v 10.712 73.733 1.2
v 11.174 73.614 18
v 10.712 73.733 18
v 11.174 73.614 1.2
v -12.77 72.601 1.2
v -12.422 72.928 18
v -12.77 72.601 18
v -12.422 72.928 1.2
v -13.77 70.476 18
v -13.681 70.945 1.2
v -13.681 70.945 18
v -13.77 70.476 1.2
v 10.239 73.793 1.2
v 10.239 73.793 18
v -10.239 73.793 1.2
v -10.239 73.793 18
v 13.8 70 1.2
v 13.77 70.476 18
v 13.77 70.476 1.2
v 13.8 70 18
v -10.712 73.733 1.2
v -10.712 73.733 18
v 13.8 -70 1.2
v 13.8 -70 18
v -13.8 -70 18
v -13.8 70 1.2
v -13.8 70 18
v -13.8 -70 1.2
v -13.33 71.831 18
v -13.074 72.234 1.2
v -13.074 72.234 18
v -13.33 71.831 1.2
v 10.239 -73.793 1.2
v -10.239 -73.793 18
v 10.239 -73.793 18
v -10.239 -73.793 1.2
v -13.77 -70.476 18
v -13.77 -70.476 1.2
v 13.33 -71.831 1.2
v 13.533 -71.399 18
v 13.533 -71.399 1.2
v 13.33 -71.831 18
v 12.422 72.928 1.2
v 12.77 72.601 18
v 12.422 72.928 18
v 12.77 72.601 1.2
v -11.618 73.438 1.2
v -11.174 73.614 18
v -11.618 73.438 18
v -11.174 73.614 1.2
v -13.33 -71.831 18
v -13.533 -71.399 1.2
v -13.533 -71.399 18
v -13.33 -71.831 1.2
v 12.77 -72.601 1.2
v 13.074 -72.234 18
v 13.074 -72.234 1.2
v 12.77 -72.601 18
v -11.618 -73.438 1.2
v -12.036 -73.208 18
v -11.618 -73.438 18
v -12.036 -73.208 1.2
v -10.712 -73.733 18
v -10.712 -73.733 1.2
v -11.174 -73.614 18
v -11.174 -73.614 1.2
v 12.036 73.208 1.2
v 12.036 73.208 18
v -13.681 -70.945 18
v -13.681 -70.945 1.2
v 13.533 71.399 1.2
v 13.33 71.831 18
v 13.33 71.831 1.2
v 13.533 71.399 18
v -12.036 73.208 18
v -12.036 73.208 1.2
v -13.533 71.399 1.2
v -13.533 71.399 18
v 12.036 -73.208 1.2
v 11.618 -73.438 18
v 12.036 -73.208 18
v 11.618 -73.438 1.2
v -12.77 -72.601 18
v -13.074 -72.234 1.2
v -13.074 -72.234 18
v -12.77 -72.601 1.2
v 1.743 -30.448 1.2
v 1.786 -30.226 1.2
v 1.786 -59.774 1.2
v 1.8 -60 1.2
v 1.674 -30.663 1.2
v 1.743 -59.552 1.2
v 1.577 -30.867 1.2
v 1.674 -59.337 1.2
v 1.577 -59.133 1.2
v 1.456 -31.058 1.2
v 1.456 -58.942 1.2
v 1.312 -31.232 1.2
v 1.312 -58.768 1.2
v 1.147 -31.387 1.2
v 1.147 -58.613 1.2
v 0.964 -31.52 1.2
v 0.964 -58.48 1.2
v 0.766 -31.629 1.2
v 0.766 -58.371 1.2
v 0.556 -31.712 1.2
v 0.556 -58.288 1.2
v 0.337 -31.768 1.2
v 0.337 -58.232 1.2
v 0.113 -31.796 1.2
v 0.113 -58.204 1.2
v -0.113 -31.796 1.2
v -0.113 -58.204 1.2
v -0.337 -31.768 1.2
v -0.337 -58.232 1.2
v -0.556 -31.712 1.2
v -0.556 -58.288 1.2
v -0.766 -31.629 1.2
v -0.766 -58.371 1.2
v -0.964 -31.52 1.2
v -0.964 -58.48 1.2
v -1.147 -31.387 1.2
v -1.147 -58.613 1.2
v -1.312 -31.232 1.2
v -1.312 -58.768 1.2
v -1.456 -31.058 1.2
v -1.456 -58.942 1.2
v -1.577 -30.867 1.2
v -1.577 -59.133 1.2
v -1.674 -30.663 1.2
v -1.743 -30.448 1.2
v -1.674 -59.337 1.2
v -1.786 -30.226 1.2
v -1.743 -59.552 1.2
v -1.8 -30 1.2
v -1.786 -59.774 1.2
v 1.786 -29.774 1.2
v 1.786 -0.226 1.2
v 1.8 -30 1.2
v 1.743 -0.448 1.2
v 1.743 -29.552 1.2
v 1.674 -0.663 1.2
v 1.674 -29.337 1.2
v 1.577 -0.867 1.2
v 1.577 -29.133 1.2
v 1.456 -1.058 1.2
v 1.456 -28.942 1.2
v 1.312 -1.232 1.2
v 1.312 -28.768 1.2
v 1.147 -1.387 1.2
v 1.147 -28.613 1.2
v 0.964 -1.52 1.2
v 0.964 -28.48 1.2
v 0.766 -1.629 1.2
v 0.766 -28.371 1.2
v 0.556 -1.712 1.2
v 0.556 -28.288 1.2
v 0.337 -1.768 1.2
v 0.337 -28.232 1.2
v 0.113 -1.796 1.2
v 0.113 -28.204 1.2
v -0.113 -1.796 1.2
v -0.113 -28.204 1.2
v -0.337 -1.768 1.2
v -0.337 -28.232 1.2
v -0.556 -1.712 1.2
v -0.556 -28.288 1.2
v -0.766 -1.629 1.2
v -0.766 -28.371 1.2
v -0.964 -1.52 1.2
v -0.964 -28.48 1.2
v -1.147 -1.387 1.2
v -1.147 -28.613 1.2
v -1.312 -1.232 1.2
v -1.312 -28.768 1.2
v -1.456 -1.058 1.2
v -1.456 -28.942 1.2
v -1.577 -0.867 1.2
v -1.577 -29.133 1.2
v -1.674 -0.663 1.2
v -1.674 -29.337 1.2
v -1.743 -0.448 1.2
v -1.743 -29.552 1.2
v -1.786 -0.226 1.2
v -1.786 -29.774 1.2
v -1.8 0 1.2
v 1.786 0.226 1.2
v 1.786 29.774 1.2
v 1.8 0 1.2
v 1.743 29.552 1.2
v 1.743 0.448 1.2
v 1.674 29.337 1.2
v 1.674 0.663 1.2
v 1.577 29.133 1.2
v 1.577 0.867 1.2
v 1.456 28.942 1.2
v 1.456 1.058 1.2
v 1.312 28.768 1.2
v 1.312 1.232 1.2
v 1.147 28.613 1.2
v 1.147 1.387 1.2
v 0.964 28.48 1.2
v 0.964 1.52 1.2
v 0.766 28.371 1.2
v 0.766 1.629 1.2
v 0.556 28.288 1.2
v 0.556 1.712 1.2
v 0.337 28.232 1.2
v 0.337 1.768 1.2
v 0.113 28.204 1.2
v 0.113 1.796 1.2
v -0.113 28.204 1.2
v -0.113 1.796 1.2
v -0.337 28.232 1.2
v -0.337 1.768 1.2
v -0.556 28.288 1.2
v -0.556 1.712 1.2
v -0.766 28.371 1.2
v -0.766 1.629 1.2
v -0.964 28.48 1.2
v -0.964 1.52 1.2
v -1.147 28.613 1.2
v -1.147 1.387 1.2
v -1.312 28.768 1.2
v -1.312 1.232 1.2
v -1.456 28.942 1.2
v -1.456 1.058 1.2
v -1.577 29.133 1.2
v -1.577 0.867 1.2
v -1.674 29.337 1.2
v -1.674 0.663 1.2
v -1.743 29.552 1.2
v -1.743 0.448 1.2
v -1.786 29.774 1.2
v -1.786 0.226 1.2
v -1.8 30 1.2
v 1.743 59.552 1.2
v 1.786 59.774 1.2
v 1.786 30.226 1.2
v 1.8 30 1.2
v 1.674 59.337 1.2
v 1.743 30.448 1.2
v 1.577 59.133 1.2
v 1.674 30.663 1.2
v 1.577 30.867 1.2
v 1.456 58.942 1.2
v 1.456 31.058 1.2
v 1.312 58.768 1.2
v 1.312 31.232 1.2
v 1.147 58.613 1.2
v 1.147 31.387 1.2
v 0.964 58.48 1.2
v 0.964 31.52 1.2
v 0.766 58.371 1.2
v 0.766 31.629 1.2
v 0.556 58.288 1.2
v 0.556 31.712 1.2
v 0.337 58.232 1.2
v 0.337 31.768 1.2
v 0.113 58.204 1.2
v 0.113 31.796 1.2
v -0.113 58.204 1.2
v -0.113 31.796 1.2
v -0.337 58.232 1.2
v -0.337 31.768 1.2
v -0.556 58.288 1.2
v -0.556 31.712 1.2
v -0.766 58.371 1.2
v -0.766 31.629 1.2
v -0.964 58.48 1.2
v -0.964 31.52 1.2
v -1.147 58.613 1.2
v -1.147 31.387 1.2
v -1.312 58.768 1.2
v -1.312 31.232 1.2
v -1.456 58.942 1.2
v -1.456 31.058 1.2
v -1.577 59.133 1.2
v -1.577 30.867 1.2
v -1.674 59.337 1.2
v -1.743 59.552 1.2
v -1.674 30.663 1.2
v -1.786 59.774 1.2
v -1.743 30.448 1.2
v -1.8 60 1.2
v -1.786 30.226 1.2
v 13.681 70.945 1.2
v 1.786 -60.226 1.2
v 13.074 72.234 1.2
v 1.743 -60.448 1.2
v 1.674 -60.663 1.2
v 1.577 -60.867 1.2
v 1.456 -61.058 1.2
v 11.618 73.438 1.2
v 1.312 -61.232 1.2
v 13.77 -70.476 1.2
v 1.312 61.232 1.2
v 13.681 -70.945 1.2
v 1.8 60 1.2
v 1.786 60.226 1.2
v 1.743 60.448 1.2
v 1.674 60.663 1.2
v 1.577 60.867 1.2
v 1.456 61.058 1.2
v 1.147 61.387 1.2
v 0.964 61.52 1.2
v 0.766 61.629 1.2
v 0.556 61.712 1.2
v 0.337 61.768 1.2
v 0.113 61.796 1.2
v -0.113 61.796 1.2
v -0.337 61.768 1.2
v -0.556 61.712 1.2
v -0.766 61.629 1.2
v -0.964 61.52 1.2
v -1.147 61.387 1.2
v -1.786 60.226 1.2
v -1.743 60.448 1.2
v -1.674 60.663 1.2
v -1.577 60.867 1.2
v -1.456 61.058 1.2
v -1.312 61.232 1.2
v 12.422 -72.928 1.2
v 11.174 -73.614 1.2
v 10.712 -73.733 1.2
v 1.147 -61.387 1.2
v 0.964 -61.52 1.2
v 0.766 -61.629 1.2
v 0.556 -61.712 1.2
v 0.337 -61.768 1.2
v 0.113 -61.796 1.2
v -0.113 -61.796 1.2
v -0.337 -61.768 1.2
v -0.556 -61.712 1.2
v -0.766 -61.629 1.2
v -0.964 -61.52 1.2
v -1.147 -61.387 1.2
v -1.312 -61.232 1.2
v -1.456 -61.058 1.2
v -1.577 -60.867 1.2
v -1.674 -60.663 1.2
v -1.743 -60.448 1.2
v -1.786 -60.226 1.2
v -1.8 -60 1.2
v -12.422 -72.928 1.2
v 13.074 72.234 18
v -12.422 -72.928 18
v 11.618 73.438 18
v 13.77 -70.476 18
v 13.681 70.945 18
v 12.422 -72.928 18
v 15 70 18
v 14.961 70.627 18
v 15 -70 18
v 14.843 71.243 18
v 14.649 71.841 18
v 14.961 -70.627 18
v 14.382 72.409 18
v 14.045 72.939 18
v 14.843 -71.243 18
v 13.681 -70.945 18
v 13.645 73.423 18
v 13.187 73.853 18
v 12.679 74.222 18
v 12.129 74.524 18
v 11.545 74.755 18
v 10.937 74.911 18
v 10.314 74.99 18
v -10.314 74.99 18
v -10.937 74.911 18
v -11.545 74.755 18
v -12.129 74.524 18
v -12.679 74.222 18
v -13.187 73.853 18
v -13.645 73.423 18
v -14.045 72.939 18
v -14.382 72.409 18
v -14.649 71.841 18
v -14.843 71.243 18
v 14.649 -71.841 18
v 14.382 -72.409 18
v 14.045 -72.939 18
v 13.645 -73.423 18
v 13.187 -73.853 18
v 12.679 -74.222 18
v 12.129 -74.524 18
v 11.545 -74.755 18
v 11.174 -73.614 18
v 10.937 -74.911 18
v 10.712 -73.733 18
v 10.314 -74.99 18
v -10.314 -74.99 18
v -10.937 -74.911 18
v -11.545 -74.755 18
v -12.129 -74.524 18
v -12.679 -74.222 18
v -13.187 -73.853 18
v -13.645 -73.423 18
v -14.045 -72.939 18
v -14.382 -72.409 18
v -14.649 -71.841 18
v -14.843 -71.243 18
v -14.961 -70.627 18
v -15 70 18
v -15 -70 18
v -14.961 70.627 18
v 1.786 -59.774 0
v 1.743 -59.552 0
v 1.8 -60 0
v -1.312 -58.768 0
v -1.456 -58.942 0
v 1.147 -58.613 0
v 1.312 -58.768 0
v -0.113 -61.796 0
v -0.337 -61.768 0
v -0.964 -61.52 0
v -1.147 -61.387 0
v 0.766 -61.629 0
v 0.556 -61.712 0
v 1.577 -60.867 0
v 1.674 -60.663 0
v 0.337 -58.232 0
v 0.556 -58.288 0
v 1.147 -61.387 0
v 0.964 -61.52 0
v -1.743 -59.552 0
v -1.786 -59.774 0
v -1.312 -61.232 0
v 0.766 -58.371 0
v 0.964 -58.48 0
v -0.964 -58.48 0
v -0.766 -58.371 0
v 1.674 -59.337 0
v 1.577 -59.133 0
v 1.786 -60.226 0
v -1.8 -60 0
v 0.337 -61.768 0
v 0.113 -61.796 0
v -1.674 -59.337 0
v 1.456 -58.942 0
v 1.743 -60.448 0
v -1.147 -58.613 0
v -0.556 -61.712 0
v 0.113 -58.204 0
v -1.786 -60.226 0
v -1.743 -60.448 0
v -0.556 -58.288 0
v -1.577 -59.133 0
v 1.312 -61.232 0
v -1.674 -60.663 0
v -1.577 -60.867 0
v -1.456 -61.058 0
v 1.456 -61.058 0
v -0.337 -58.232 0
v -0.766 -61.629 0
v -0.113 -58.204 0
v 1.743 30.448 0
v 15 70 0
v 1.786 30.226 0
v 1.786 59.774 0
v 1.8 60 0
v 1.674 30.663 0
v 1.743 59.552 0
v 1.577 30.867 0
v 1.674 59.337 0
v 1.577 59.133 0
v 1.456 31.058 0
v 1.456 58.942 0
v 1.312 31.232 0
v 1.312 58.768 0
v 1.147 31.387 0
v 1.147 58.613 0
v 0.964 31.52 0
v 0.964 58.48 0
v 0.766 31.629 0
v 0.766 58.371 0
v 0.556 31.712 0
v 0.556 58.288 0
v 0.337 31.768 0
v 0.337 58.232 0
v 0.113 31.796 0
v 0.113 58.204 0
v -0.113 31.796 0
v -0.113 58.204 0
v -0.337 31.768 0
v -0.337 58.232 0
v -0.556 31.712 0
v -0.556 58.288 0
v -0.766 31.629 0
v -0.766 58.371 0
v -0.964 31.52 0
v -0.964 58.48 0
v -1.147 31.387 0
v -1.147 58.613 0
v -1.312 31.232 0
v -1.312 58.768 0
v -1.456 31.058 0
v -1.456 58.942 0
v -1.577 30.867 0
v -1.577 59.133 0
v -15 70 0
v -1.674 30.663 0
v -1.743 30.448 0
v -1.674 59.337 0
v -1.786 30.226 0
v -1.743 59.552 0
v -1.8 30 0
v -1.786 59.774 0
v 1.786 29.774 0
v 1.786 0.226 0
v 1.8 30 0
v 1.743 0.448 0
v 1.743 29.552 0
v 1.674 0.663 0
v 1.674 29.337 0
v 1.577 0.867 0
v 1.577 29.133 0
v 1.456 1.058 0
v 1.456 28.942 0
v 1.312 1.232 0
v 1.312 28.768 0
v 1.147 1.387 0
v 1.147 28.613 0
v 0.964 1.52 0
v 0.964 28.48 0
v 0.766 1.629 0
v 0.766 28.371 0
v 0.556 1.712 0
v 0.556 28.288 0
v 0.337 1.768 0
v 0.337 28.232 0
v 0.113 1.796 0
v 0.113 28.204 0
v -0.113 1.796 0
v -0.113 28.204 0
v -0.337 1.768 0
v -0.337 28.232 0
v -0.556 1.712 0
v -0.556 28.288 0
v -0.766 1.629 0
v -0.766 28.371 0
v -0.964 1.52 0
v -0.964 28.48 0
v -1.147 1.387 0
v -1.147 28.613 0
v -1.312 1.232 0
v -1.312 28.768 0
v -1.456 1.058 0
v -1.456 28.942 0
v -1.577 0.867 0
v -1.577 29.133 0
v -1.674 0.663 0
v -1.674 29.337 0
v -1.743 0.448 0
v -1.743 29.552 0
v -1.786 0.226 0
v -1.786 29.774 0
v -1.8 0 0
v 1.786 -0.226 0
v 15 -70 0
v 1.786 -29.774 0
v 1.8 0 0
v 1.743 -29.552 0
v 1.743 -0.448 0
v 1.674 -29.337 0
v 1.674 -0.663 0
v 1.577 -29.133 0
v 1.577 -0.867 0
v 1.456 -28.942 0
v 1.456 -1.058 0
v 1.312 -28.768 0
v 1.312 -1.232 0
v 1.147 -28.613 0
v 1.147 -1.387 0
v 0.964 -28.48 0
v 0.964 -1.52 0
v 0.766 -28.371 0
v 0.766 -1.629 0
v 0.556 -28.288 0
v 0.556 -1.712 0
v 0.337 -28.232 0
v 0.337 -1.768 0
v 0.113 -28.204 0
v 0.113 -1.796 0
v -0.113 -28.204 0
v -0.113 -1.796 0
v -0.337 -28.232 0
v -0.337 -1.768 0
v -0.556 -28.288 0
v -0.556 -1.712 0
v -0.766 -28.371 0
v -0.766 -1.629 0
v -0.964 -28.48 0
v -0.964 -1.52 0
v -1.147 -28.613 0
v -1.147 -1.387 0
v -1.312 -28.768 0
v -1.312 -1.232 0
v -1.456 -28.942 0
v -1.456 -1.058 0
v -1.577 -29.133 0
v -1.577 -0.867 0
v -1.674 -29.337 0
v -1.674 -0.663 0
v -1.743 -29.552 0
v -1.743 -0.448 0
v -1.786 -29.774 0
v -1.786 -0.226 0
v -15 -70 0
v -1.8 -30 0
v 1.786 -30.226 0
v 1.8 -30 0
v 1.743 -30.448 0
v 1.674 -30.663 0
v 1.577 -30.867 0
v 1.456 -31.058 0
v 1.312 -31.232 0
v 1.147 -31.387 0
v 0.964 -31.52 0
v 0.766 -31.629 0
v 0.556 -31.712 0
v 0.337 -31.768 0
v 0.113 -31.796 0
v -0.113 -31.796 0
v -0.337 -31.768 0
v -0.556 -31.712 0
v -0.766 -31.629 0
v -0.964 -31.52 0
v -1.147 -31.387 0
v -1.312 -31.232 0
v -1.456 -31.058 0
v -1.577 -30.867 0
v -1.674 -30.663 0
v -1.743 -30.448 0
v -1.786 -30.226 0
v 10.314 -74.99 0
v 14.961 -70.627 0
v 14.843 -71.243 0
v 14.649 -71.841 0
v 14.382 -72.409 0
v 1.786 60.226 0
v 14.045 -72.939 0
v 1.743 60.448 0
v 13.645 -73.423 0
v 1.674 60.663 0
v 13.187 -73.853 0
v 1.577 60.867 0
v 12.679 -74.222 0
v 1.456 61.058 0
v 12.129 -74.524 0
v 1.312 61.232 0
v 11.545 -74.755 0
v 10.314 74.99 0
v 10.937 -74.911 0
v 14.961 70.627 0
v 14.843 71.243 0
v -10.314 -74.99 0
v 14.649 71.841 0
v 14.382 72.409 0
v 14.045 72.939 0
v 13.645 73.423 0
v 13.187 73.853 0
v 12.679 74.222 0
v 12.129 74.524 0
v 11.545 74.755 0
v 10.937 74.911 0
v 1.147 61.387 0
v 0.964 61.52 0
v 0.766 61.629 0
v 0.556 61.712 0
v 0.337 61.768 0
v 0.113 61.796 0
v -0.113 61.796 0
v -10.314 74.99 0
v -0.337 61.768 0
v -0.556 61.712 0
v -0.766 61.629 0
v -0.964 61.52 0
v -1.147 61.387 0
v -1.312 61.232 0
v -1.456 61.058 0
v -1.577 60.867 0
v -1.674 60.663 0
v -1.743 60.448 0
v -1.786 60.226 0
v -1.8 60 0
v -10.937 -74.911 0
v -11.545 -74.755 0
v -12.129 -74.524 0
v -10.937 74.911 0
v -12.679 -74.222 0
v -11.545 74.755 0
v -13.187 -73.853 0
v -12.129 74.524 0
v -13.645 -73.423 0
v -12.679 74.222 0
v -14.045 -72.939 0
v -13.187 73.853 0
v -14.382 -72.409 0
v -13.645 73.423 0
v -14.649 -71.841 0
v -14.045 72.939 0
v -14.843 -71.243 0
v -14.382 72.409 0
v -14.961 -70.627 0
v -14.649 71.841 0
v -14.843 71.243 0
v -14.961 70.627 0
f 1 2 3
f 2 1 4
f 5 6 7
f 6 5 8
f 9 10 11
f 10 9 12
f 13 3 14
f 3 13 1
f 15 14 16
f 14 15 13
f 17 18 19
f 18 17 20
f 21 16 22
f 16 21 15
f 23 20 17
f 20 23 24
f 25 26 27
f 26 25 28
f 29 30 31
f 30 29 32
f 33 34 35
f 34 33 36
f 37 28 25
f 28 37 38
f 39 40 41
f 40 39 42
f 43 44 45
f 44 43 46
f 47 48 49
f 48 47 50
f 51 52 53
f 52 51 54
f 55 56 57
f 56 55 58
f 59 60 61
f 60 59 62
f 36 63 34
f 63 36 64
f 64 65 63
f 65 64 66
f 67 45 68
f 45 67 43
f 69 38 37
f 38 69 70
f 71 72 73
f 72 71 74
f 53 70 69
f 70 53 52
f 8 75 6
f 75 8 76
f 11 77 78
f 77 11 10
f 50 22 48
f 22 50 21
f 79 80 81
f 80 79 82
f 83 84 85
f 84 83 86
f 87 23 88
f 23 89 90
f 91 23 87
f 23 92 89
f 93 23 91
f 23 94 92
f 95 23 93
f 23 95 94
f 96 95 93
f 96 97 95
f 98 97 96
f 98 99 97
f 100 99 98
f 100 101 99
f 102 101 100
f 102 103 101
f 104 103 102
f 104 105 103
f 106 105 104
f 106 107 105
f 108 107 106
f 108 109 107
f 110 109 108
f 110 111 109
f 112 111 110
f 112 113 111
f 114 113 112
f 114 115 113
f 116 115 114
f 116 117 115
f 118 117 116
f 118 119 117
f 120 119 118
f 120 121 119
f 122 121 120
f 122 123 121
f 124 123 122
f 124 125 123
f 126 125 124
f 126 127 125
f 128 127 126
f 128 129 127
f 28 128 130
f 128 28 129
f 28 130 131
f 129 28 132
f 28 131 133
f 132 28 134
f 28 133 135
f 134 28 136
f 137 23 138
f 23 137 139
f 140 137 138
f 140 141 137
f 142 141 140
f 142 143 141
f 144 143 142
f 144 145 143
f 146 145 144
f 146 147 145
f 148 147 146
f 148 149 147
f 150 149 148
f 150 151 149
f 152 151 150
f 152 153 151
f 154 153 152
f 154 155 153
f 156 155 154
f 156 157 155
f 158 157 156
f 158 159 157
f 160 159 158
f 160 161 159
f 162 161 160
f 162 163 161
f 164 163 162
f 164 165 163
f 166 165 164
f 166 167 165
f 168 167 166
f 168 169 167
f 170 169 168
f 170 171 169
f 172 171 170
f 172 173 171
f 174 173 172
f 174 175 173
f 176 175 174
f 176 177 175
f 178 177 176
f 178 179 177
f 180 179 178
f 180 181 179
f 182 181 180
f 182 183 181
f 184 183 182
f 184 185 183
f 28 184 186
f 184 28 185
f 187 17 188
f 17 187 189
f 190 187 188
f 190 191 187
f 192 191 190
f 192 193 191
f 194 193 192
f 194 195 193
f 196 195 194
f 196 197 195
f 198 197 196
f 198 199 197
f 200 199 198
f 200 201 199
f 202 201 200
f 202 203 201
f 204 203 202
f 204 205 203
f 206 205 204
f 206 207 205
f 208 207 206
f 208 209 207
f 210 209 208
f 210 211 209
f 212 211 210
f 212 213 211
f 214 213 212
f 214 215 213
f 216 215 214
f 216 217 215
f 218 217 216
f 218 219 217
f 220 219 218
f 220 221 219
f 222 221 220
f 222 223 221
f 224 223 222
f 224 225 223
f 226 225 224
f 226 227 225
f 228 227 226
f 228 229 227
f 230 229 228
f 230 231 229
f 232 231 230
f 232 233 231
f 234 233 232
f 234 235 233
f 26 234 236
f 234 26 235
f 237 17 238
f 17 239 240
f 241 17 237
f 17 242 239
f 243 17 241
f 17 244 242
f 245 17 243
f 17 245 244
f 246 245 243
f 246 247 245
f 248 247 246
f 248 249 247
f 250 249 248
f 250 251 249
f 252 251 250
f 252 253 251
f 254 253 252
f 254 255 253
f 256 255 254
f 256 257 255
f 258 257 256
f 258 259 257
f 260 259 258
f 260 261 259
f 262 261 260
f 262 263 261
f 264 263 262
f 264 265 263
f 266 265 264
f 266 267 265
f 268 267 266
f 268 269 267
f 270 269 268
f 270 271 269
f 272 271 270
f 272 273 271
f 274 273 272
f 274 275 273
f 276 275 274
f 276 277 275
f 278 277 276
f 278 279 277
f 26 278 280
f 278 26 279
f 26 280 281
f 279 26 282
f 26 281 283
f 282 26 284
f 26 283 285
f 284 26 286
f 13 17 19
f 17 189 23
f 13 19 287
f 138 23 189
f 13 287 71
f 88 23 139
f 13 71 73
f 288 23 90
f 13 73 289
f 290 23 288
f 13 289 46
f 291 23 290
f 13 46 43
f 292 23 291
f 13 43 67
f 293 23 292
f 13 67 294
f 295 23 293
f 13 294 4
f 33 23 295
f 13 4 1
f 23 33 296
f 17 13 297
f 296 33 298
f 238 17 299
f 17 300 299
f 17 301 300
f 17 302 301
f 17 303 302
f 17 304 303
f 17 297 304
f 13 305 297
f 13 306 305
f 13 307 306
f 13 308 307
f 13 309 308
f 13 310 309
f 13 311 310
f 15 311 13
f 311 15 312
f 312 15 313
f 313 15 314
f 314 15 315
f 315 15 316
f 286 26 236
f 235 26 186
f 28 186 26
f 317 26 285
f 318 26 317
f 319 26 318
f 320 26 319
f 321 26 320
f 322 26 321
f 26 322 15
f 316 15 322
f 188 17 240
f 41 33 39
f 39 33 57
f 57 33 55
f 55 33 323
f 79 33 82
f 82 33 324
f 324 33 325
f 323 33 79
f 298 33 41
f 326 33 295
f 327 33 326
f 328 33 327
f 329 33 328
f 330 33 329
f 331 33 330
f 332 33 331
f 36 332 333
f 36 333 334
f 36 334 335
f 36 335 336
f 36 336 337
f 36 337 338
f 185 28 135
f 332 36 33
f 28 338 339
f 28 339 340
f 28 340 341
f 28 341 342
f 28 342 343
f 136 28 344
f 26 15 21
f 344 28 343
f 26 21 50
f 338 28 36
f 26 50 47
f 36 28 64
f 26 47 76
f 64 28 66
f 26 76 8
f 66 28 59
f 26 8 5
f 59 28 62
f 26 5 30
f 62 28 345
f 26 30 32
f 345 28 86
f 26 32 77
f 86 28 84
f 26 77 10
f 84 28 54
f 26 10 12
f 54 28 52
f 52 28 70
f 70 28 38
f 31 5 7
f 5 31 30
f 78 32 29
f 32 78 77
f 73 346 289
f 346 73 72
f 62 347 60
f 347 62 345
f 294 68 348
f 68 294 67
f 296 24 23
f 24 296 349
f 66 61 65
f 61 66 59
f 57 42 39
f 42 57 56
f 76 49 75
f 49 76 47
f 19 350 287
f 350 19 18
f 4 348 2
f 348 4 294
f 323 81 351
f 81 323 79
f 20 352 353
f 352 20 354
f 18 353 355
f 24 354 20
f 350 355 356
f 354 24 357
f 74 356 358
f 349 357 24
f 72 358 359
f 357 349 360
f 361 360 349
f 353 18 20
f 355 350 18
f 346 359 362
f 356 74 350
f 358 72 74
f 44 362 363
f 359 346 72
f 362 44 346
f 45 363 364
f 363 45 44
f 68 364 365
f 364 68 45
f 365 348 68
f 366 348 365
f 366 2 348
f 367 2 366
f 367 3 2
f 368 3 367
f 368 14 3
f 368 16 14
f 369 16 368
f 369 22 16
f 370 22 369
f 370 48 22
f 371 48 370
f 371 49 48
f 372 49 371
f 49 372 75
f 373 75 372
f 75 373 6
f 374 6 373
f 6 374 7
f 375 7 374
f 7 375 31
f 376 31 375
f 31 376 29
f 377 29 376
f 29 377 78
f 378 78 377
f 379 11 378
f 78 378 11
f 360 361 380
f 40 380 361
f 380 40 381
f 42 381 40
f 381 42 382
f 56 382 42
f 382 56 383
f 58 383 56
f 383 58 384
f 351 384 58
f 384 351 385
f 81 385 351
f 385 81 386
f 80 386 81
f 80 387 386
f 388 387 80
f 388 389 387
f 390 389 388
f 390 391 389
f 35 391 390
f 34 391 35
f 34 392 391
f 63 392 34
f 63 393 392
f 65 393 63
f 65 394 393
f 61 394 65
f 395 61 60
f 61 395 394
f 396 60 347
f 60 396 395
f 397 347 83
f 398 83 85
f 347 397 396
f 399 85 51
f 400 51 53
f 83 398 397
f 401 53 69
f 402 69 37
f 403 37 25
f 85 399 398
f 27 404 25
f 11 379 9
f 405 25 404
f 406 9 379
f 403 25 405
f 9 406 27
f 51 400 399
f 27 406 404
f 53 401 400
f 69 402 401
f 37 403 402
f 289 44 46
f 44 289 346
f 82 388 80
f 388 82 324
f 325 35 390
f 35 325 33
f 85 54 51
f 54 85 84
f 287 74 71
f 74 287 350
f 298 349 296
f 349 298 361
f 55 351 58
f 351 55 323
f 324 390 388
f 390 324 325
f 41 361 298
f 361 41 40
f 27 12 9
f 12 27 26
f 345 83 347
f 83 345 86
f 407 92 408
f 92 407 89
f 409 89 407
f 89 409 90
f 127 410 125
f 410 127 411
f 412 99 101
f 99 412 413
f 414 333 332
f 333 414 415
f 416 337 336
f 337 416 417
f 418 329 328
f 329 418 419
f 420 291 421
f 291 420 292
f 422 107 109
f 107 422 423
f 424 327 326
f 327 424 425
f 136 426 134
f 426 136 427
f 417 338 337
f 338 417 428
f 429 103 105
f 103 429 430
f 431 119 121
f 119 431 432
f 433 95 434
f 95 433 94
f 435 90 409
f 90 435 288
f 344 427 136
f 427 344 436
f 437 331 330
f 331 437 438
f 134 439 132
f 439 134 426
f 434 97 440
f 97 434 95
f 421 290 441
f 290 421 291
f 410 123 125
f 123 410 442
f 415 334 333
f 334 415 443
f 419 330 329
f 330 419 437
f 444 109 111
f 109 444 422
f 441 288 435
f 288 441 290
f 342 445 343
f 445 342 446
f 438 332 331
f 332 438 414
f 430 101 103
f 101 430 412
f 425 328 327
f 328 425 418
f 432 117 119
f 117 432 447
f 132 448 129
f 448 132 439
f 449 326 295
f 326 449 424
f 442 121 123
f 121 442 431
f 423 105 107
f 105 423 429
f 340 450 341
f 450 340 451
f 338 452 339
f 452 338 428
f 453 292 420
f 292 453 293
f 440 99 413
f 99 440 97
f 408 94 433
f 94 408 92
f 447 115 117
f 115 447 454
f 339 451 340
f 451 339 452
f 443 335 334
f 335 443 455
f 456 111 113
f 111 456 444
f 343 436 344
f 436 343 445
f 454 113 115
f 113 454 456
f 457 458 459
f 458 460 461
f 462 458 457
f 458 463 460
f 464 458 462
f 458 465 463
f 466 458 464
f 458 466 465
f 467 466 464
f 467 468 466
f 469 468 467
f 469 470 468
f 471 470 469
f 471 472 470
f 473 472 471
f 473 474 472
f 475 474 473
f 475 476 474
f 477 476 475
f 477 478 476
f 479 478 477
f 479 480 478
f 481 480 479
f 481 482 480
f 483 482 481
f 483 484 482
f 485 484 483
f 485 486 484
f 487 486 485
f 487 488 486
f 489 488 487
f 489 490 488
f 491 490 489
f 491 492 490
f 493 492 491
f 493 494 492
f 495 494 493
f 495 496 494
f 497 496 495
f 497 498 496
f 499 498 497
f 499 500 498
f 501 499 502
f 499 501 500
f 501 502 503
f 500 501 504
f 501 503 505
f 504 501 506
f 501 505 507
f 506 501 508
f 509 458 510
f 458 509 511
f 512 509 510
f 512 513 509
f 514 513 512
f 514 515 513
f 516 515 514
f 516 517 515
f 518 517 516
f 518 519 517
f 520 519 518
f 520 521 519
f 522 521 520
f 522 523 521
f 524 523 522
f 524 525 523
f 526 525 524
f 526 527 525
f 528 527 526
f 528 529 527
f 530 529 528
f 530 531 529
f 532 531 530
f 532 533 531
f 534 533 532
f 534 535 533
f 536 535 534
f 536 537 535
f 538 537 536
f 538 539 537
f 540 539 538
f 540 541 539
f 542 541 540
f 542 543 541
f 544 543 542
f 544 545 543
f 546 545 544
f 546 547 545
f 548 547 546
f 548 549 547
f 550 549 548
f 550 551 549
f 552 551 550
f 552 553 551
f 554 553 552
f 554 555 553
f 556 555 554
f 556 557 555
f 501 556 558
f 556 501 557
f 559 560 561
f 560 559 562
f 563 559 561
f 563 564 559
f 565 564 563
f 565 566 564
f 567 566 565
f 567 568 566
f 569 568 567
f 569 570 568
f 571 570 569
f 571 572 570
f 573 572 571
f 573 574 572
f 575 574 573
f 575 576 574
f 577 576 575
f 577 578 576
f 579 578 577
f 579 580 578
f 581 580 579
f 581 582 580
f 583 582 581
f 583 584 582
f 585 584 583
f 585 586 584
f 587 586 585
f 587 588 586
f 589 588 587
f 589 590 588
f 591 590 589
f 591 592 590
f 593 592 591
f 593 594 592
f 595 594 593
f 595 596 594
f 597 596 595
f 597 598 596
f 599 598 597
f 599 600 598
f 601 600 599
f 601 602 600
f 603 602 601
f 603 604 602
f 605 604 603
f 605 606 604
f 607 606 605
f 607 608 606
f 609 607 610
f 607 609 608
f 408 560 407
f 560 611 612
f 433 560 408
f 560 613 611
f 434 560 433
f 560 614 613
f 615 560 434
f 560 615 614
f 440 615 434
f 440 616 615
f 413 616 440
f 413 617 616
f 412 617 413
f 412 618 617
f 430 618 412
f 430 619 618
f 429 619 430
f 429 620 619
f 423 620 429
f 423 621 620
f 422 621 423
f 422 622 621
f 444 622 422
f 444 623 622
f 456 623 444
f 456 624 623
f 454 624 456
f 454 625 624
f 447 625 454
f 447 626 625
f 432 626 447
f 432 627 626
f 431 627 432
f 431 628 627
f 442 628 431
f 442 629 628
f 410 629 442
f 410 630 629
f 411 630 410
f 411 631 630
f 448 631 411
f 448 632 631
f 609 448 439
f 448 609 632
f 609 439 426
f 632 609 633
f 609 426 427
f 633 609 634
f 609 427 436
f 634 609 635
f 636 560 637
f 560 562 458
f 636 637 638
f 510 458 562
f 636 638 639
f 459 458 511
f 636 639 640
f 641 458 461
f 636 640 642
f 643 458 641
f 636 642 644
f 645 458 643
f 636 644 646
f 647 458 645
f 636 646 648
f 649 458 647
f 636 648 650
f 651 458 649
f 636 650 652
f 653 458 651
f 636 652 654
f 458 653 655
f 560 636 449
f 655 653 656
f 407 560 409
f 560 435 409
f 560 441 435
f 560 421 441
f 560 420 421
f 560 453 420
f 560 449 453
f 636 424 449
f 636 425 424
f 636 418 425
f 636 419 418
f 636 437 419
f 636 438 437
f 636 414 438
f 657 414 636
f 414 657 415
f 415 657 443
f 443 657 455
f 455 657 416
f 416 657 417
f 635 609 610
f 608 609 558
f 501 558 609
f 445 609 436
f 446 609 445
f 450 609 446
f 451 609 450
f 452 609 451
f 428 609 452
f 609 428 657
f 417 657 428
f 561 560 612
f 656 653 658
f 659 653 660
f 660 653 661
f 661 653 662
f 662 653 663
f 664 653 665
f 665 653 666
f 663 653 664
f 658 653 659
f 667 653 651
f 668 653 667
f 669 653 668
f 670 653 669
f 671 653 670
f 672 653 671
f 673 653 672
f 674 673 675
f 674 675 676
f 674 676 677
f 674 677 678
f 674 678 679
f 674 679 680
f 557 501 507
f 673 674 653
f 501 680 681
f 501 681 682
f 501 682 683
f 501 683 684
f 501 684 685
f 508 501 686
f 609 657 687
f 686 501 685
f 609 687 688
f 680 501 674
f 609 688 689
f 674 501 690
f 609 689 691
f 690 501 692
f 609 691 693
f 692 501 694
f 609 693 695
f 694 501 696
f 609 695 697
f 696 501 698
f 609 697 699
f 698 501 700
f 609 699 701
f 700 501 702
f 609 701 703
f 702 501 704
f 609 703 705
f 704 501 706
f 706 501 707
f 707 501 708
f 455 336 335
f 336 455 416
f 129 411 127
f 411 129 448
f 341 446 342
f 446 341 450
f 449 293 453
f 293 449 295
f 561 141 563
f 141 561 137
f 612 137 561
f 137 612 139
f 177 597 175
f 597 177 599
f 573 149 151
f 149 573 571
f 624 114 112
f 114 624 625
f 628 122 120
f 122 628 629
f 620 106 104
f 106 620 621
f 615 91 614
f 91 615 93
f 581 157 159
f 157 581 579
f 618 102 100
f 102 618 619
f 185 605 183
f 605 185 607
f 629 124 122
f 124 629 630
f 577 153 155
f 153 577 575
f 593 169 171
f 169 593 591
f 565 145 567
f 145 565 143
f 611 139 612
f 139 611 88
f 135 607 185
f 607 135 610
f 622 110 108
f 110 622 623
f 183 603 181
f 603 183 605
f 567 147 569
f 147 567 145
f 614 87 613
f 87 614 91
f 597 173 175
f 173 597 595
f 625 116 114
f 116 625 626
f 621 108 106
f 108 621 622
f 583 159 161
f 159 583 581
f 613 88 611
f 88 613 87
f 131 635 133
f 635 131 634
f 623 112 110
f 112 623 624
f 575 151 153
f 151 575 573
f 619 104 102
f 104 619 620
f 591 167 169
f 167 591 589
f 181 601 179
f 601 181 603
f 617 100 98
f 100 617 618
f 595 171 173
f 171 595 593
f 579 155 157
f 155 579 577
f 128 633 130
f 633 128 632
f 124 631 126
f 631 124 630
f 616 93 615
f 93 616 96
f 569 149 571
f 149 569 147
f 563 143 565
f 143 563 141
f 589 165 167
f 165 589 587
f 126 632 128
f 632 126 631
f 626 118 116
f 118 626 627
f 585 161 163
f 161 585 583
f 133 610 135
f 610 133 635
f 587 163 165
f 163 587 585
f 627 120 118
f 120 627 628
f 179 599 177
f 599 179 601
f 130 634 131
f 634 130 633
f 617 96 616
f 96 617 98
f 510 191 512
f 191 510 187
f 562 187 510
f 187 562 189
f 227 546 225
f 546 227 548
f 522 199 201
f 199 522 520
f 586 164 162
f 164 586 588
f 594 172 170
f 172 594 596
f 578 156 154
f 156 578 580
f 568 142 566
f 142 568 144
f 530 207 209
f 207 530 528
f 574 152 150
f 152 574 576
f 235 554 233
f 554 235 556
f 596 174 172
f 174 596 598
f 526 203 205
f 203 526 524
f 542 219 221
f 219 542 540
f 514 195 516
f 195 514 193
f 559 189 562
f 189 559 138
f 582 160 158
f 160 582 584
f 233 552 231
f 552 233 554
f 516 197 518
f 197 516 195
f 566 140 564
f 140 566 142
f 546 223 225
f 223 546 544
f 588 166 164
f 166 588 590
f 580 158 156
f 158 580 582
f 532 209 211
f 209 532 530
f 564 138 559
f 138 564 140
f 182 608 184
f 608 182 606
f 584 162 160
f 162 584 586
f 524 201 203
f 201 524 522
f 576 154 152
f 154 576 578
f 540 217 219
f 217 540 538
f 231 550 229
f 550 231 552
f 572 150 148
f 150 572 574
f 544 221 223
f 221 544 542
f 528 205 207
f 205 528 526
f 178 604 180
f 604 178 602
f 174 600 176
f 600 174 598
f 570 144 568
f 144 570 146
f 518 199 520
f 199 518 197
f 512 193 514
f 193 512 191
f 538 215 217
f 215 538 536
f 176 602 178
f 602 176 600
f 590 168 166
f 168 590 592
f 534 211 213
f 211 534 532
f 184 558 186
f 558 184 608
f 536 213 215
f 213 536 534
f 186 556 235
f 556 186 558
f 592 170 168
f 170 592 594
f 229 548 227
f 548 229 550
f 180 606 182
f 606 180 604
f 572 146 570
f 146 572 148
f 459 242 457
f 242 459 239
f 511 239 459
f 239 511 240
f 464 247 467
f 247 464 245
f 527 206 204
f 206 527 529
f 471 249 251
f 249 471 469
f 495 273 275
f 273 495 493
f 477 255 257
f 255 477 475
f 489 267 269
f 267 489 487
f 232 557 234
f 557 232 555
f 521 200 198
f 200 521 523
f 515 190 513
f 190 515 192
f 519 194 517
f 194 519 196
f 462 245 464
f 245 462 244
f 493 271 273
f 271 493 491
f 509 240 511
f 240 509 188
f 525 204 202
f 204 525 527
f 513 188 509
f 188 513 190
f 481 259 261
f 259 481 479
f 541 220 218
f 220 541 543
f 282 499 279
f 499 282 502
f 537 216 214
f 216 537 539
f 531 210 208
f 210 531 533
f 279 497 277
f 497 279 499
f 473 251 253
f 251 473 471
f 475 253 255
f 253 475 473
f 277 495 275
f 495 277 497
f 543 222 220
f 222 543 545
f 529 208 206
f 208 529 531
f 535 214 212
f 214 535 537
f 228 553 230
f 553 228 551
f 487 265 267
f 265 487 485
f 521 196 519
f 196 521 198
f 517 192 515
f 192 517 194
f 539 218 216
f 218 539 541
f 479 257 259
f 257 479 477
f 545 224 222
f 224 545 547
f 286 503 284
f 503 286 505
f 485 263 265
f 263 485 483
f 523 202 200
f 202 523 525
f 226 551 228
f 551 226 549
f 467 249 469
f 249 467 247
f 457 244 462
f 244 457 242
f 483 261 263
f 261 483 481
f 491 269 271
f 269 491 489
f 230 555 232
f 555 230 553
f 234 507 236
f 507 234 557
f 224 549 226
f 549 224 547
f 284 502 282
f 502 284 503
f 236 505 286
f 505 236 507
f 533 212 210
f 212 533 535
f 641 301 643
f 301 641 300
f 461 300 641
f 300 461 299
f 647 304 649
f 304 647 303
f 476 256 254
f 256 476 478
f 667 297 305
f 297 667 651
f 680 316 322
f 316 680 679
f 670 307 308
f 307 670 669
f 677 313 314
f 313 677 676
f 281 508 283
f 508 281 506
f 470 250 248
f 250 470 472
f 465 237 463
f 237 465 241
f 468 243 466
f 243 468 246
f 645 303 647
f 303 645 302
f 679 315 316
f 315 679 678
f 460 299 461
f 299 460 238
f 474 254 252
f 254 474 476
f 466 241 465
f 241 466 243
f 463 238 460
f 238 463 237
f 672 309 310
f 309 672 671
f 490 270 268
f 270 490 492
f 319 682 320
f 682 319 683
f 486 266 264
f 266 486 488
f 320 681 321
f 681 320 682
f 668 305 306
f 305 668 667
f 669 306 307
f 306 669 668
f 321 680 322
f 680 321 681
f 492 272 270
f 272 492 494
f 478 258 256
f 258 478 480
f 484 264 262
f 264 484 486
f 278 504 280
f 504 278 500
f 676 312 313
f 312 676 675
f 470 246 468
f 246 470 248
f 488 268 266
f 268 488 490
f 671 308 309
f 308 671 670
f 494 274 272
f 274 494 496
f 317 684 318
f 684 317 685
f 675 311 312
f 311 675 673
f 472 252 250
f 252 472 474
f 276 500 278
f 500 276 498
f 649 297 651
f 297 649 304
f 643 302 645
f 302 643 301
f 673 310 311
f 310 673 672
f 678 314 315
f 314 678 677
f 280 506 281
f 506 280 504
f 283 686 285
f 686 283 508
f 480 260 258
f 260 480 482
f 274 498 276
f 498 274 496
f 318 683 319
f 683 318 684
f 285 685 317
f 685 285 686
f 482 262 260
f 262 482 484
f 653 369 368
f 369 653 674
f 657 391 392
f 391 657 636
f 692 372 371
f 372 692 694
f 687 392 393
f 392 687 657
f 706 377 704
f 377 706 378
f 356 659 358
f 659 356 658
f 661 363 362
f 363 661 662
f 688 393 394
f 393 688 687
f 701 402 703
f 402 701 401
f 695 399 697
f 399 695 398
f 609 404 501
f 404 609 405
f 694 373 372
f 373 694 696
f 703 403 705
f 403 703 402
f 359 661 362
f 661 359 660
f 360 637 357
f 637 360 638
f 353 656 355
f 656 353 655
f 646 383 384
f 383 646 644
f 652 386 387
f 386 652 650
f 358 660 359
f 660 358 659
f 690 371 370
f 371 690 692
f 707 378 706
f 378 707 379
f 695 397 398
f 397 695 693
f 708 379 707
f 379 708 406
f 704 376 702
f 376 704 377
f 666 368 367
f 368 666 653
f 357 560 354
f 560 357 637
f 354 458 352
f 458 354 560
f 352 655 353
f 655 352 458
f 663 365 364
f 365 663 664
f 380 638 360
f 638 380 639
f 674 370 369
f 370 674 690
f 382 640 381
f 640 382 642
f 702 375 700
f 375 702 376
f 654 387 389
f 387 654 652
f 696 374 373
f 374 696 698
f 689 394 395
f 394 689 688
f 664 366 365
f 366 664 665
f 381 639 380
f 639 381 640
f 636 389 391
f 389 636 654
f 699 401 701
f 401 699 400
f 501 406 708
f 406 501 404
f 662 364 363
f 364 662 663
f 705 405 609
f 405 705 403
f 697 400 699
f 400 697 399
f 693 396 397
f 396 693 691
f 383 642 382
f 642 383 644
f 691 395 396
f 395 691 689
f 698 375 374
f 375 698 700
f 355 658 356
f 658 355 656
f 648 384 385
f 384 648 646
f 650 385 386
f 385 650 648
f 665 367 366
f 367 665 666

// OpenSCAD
$fn = 50;


difference() {
	union() {
		hull() {
			translate(v = [-10.0000000000, 70.0000000000, 0]) {
				cylinder(h = 18, r = 5);
			}
			translate(v = [10.0000000000, 70.0000000000, 0]) {
				cylinder(h = 18, r = 5);
			}
			translate(v = [-10.0000000000, -70.0000000000, 0]) {
				cylinder(h = 18, r = 5);
			}
			translate(v = [10.0000000000, -70.0000000000, 0]) {
				cylinder(h = 18, r = 5);
			}
		}
	}
	union() {
		translate(v = [0, 0, 1.2000000000]) {
			hull() {
				translate(v = [-10.0000000000, 70.0000000000, 0]) {
					cylinder(h = 16.8000000000, r = 3.8000000000);
				}
				translate(v = [10.0000000000, 70.0000000000, 0]) {
					cylinder(h = 16.8000000000, r = 3.8000000000);
				}
				translate(v = [-10.0000000000, -70.0000000000, 0]) {
					cylinder(h = 16.8000000000, r = 3.8000000000);
				}
				translate(v = [10.0000000000, -70.0000000000, 0]) {
					cylinder(h = 16.8000000000, r = 3.8000000000);
				}
			}
		}
		#translate(v = [0.0000000000, -60.0000000000, 0]) {
			cylinder(h = 1.2000000000, r = 1.8000000000);
		}
		#translate(v = [0.0000000000, -30.0000000000, 0]) {
			cylinder(h = 1.2000000000, r = 1.8000000000);
		}
		#cylinder(h = 1.2000000000, r = 1.8000000000);
		#translate(v = [0.0000000000, 30.0000000000, 0]) {
			cylinder(h = 1.2000000000, r = 1.8000000000);
		}
		#translate(v = [0.0000000000, 60.0000000000, 0]) {
			cylinder(h = 1.2000000000, r = 1.8000000000);
		}
	}
}
